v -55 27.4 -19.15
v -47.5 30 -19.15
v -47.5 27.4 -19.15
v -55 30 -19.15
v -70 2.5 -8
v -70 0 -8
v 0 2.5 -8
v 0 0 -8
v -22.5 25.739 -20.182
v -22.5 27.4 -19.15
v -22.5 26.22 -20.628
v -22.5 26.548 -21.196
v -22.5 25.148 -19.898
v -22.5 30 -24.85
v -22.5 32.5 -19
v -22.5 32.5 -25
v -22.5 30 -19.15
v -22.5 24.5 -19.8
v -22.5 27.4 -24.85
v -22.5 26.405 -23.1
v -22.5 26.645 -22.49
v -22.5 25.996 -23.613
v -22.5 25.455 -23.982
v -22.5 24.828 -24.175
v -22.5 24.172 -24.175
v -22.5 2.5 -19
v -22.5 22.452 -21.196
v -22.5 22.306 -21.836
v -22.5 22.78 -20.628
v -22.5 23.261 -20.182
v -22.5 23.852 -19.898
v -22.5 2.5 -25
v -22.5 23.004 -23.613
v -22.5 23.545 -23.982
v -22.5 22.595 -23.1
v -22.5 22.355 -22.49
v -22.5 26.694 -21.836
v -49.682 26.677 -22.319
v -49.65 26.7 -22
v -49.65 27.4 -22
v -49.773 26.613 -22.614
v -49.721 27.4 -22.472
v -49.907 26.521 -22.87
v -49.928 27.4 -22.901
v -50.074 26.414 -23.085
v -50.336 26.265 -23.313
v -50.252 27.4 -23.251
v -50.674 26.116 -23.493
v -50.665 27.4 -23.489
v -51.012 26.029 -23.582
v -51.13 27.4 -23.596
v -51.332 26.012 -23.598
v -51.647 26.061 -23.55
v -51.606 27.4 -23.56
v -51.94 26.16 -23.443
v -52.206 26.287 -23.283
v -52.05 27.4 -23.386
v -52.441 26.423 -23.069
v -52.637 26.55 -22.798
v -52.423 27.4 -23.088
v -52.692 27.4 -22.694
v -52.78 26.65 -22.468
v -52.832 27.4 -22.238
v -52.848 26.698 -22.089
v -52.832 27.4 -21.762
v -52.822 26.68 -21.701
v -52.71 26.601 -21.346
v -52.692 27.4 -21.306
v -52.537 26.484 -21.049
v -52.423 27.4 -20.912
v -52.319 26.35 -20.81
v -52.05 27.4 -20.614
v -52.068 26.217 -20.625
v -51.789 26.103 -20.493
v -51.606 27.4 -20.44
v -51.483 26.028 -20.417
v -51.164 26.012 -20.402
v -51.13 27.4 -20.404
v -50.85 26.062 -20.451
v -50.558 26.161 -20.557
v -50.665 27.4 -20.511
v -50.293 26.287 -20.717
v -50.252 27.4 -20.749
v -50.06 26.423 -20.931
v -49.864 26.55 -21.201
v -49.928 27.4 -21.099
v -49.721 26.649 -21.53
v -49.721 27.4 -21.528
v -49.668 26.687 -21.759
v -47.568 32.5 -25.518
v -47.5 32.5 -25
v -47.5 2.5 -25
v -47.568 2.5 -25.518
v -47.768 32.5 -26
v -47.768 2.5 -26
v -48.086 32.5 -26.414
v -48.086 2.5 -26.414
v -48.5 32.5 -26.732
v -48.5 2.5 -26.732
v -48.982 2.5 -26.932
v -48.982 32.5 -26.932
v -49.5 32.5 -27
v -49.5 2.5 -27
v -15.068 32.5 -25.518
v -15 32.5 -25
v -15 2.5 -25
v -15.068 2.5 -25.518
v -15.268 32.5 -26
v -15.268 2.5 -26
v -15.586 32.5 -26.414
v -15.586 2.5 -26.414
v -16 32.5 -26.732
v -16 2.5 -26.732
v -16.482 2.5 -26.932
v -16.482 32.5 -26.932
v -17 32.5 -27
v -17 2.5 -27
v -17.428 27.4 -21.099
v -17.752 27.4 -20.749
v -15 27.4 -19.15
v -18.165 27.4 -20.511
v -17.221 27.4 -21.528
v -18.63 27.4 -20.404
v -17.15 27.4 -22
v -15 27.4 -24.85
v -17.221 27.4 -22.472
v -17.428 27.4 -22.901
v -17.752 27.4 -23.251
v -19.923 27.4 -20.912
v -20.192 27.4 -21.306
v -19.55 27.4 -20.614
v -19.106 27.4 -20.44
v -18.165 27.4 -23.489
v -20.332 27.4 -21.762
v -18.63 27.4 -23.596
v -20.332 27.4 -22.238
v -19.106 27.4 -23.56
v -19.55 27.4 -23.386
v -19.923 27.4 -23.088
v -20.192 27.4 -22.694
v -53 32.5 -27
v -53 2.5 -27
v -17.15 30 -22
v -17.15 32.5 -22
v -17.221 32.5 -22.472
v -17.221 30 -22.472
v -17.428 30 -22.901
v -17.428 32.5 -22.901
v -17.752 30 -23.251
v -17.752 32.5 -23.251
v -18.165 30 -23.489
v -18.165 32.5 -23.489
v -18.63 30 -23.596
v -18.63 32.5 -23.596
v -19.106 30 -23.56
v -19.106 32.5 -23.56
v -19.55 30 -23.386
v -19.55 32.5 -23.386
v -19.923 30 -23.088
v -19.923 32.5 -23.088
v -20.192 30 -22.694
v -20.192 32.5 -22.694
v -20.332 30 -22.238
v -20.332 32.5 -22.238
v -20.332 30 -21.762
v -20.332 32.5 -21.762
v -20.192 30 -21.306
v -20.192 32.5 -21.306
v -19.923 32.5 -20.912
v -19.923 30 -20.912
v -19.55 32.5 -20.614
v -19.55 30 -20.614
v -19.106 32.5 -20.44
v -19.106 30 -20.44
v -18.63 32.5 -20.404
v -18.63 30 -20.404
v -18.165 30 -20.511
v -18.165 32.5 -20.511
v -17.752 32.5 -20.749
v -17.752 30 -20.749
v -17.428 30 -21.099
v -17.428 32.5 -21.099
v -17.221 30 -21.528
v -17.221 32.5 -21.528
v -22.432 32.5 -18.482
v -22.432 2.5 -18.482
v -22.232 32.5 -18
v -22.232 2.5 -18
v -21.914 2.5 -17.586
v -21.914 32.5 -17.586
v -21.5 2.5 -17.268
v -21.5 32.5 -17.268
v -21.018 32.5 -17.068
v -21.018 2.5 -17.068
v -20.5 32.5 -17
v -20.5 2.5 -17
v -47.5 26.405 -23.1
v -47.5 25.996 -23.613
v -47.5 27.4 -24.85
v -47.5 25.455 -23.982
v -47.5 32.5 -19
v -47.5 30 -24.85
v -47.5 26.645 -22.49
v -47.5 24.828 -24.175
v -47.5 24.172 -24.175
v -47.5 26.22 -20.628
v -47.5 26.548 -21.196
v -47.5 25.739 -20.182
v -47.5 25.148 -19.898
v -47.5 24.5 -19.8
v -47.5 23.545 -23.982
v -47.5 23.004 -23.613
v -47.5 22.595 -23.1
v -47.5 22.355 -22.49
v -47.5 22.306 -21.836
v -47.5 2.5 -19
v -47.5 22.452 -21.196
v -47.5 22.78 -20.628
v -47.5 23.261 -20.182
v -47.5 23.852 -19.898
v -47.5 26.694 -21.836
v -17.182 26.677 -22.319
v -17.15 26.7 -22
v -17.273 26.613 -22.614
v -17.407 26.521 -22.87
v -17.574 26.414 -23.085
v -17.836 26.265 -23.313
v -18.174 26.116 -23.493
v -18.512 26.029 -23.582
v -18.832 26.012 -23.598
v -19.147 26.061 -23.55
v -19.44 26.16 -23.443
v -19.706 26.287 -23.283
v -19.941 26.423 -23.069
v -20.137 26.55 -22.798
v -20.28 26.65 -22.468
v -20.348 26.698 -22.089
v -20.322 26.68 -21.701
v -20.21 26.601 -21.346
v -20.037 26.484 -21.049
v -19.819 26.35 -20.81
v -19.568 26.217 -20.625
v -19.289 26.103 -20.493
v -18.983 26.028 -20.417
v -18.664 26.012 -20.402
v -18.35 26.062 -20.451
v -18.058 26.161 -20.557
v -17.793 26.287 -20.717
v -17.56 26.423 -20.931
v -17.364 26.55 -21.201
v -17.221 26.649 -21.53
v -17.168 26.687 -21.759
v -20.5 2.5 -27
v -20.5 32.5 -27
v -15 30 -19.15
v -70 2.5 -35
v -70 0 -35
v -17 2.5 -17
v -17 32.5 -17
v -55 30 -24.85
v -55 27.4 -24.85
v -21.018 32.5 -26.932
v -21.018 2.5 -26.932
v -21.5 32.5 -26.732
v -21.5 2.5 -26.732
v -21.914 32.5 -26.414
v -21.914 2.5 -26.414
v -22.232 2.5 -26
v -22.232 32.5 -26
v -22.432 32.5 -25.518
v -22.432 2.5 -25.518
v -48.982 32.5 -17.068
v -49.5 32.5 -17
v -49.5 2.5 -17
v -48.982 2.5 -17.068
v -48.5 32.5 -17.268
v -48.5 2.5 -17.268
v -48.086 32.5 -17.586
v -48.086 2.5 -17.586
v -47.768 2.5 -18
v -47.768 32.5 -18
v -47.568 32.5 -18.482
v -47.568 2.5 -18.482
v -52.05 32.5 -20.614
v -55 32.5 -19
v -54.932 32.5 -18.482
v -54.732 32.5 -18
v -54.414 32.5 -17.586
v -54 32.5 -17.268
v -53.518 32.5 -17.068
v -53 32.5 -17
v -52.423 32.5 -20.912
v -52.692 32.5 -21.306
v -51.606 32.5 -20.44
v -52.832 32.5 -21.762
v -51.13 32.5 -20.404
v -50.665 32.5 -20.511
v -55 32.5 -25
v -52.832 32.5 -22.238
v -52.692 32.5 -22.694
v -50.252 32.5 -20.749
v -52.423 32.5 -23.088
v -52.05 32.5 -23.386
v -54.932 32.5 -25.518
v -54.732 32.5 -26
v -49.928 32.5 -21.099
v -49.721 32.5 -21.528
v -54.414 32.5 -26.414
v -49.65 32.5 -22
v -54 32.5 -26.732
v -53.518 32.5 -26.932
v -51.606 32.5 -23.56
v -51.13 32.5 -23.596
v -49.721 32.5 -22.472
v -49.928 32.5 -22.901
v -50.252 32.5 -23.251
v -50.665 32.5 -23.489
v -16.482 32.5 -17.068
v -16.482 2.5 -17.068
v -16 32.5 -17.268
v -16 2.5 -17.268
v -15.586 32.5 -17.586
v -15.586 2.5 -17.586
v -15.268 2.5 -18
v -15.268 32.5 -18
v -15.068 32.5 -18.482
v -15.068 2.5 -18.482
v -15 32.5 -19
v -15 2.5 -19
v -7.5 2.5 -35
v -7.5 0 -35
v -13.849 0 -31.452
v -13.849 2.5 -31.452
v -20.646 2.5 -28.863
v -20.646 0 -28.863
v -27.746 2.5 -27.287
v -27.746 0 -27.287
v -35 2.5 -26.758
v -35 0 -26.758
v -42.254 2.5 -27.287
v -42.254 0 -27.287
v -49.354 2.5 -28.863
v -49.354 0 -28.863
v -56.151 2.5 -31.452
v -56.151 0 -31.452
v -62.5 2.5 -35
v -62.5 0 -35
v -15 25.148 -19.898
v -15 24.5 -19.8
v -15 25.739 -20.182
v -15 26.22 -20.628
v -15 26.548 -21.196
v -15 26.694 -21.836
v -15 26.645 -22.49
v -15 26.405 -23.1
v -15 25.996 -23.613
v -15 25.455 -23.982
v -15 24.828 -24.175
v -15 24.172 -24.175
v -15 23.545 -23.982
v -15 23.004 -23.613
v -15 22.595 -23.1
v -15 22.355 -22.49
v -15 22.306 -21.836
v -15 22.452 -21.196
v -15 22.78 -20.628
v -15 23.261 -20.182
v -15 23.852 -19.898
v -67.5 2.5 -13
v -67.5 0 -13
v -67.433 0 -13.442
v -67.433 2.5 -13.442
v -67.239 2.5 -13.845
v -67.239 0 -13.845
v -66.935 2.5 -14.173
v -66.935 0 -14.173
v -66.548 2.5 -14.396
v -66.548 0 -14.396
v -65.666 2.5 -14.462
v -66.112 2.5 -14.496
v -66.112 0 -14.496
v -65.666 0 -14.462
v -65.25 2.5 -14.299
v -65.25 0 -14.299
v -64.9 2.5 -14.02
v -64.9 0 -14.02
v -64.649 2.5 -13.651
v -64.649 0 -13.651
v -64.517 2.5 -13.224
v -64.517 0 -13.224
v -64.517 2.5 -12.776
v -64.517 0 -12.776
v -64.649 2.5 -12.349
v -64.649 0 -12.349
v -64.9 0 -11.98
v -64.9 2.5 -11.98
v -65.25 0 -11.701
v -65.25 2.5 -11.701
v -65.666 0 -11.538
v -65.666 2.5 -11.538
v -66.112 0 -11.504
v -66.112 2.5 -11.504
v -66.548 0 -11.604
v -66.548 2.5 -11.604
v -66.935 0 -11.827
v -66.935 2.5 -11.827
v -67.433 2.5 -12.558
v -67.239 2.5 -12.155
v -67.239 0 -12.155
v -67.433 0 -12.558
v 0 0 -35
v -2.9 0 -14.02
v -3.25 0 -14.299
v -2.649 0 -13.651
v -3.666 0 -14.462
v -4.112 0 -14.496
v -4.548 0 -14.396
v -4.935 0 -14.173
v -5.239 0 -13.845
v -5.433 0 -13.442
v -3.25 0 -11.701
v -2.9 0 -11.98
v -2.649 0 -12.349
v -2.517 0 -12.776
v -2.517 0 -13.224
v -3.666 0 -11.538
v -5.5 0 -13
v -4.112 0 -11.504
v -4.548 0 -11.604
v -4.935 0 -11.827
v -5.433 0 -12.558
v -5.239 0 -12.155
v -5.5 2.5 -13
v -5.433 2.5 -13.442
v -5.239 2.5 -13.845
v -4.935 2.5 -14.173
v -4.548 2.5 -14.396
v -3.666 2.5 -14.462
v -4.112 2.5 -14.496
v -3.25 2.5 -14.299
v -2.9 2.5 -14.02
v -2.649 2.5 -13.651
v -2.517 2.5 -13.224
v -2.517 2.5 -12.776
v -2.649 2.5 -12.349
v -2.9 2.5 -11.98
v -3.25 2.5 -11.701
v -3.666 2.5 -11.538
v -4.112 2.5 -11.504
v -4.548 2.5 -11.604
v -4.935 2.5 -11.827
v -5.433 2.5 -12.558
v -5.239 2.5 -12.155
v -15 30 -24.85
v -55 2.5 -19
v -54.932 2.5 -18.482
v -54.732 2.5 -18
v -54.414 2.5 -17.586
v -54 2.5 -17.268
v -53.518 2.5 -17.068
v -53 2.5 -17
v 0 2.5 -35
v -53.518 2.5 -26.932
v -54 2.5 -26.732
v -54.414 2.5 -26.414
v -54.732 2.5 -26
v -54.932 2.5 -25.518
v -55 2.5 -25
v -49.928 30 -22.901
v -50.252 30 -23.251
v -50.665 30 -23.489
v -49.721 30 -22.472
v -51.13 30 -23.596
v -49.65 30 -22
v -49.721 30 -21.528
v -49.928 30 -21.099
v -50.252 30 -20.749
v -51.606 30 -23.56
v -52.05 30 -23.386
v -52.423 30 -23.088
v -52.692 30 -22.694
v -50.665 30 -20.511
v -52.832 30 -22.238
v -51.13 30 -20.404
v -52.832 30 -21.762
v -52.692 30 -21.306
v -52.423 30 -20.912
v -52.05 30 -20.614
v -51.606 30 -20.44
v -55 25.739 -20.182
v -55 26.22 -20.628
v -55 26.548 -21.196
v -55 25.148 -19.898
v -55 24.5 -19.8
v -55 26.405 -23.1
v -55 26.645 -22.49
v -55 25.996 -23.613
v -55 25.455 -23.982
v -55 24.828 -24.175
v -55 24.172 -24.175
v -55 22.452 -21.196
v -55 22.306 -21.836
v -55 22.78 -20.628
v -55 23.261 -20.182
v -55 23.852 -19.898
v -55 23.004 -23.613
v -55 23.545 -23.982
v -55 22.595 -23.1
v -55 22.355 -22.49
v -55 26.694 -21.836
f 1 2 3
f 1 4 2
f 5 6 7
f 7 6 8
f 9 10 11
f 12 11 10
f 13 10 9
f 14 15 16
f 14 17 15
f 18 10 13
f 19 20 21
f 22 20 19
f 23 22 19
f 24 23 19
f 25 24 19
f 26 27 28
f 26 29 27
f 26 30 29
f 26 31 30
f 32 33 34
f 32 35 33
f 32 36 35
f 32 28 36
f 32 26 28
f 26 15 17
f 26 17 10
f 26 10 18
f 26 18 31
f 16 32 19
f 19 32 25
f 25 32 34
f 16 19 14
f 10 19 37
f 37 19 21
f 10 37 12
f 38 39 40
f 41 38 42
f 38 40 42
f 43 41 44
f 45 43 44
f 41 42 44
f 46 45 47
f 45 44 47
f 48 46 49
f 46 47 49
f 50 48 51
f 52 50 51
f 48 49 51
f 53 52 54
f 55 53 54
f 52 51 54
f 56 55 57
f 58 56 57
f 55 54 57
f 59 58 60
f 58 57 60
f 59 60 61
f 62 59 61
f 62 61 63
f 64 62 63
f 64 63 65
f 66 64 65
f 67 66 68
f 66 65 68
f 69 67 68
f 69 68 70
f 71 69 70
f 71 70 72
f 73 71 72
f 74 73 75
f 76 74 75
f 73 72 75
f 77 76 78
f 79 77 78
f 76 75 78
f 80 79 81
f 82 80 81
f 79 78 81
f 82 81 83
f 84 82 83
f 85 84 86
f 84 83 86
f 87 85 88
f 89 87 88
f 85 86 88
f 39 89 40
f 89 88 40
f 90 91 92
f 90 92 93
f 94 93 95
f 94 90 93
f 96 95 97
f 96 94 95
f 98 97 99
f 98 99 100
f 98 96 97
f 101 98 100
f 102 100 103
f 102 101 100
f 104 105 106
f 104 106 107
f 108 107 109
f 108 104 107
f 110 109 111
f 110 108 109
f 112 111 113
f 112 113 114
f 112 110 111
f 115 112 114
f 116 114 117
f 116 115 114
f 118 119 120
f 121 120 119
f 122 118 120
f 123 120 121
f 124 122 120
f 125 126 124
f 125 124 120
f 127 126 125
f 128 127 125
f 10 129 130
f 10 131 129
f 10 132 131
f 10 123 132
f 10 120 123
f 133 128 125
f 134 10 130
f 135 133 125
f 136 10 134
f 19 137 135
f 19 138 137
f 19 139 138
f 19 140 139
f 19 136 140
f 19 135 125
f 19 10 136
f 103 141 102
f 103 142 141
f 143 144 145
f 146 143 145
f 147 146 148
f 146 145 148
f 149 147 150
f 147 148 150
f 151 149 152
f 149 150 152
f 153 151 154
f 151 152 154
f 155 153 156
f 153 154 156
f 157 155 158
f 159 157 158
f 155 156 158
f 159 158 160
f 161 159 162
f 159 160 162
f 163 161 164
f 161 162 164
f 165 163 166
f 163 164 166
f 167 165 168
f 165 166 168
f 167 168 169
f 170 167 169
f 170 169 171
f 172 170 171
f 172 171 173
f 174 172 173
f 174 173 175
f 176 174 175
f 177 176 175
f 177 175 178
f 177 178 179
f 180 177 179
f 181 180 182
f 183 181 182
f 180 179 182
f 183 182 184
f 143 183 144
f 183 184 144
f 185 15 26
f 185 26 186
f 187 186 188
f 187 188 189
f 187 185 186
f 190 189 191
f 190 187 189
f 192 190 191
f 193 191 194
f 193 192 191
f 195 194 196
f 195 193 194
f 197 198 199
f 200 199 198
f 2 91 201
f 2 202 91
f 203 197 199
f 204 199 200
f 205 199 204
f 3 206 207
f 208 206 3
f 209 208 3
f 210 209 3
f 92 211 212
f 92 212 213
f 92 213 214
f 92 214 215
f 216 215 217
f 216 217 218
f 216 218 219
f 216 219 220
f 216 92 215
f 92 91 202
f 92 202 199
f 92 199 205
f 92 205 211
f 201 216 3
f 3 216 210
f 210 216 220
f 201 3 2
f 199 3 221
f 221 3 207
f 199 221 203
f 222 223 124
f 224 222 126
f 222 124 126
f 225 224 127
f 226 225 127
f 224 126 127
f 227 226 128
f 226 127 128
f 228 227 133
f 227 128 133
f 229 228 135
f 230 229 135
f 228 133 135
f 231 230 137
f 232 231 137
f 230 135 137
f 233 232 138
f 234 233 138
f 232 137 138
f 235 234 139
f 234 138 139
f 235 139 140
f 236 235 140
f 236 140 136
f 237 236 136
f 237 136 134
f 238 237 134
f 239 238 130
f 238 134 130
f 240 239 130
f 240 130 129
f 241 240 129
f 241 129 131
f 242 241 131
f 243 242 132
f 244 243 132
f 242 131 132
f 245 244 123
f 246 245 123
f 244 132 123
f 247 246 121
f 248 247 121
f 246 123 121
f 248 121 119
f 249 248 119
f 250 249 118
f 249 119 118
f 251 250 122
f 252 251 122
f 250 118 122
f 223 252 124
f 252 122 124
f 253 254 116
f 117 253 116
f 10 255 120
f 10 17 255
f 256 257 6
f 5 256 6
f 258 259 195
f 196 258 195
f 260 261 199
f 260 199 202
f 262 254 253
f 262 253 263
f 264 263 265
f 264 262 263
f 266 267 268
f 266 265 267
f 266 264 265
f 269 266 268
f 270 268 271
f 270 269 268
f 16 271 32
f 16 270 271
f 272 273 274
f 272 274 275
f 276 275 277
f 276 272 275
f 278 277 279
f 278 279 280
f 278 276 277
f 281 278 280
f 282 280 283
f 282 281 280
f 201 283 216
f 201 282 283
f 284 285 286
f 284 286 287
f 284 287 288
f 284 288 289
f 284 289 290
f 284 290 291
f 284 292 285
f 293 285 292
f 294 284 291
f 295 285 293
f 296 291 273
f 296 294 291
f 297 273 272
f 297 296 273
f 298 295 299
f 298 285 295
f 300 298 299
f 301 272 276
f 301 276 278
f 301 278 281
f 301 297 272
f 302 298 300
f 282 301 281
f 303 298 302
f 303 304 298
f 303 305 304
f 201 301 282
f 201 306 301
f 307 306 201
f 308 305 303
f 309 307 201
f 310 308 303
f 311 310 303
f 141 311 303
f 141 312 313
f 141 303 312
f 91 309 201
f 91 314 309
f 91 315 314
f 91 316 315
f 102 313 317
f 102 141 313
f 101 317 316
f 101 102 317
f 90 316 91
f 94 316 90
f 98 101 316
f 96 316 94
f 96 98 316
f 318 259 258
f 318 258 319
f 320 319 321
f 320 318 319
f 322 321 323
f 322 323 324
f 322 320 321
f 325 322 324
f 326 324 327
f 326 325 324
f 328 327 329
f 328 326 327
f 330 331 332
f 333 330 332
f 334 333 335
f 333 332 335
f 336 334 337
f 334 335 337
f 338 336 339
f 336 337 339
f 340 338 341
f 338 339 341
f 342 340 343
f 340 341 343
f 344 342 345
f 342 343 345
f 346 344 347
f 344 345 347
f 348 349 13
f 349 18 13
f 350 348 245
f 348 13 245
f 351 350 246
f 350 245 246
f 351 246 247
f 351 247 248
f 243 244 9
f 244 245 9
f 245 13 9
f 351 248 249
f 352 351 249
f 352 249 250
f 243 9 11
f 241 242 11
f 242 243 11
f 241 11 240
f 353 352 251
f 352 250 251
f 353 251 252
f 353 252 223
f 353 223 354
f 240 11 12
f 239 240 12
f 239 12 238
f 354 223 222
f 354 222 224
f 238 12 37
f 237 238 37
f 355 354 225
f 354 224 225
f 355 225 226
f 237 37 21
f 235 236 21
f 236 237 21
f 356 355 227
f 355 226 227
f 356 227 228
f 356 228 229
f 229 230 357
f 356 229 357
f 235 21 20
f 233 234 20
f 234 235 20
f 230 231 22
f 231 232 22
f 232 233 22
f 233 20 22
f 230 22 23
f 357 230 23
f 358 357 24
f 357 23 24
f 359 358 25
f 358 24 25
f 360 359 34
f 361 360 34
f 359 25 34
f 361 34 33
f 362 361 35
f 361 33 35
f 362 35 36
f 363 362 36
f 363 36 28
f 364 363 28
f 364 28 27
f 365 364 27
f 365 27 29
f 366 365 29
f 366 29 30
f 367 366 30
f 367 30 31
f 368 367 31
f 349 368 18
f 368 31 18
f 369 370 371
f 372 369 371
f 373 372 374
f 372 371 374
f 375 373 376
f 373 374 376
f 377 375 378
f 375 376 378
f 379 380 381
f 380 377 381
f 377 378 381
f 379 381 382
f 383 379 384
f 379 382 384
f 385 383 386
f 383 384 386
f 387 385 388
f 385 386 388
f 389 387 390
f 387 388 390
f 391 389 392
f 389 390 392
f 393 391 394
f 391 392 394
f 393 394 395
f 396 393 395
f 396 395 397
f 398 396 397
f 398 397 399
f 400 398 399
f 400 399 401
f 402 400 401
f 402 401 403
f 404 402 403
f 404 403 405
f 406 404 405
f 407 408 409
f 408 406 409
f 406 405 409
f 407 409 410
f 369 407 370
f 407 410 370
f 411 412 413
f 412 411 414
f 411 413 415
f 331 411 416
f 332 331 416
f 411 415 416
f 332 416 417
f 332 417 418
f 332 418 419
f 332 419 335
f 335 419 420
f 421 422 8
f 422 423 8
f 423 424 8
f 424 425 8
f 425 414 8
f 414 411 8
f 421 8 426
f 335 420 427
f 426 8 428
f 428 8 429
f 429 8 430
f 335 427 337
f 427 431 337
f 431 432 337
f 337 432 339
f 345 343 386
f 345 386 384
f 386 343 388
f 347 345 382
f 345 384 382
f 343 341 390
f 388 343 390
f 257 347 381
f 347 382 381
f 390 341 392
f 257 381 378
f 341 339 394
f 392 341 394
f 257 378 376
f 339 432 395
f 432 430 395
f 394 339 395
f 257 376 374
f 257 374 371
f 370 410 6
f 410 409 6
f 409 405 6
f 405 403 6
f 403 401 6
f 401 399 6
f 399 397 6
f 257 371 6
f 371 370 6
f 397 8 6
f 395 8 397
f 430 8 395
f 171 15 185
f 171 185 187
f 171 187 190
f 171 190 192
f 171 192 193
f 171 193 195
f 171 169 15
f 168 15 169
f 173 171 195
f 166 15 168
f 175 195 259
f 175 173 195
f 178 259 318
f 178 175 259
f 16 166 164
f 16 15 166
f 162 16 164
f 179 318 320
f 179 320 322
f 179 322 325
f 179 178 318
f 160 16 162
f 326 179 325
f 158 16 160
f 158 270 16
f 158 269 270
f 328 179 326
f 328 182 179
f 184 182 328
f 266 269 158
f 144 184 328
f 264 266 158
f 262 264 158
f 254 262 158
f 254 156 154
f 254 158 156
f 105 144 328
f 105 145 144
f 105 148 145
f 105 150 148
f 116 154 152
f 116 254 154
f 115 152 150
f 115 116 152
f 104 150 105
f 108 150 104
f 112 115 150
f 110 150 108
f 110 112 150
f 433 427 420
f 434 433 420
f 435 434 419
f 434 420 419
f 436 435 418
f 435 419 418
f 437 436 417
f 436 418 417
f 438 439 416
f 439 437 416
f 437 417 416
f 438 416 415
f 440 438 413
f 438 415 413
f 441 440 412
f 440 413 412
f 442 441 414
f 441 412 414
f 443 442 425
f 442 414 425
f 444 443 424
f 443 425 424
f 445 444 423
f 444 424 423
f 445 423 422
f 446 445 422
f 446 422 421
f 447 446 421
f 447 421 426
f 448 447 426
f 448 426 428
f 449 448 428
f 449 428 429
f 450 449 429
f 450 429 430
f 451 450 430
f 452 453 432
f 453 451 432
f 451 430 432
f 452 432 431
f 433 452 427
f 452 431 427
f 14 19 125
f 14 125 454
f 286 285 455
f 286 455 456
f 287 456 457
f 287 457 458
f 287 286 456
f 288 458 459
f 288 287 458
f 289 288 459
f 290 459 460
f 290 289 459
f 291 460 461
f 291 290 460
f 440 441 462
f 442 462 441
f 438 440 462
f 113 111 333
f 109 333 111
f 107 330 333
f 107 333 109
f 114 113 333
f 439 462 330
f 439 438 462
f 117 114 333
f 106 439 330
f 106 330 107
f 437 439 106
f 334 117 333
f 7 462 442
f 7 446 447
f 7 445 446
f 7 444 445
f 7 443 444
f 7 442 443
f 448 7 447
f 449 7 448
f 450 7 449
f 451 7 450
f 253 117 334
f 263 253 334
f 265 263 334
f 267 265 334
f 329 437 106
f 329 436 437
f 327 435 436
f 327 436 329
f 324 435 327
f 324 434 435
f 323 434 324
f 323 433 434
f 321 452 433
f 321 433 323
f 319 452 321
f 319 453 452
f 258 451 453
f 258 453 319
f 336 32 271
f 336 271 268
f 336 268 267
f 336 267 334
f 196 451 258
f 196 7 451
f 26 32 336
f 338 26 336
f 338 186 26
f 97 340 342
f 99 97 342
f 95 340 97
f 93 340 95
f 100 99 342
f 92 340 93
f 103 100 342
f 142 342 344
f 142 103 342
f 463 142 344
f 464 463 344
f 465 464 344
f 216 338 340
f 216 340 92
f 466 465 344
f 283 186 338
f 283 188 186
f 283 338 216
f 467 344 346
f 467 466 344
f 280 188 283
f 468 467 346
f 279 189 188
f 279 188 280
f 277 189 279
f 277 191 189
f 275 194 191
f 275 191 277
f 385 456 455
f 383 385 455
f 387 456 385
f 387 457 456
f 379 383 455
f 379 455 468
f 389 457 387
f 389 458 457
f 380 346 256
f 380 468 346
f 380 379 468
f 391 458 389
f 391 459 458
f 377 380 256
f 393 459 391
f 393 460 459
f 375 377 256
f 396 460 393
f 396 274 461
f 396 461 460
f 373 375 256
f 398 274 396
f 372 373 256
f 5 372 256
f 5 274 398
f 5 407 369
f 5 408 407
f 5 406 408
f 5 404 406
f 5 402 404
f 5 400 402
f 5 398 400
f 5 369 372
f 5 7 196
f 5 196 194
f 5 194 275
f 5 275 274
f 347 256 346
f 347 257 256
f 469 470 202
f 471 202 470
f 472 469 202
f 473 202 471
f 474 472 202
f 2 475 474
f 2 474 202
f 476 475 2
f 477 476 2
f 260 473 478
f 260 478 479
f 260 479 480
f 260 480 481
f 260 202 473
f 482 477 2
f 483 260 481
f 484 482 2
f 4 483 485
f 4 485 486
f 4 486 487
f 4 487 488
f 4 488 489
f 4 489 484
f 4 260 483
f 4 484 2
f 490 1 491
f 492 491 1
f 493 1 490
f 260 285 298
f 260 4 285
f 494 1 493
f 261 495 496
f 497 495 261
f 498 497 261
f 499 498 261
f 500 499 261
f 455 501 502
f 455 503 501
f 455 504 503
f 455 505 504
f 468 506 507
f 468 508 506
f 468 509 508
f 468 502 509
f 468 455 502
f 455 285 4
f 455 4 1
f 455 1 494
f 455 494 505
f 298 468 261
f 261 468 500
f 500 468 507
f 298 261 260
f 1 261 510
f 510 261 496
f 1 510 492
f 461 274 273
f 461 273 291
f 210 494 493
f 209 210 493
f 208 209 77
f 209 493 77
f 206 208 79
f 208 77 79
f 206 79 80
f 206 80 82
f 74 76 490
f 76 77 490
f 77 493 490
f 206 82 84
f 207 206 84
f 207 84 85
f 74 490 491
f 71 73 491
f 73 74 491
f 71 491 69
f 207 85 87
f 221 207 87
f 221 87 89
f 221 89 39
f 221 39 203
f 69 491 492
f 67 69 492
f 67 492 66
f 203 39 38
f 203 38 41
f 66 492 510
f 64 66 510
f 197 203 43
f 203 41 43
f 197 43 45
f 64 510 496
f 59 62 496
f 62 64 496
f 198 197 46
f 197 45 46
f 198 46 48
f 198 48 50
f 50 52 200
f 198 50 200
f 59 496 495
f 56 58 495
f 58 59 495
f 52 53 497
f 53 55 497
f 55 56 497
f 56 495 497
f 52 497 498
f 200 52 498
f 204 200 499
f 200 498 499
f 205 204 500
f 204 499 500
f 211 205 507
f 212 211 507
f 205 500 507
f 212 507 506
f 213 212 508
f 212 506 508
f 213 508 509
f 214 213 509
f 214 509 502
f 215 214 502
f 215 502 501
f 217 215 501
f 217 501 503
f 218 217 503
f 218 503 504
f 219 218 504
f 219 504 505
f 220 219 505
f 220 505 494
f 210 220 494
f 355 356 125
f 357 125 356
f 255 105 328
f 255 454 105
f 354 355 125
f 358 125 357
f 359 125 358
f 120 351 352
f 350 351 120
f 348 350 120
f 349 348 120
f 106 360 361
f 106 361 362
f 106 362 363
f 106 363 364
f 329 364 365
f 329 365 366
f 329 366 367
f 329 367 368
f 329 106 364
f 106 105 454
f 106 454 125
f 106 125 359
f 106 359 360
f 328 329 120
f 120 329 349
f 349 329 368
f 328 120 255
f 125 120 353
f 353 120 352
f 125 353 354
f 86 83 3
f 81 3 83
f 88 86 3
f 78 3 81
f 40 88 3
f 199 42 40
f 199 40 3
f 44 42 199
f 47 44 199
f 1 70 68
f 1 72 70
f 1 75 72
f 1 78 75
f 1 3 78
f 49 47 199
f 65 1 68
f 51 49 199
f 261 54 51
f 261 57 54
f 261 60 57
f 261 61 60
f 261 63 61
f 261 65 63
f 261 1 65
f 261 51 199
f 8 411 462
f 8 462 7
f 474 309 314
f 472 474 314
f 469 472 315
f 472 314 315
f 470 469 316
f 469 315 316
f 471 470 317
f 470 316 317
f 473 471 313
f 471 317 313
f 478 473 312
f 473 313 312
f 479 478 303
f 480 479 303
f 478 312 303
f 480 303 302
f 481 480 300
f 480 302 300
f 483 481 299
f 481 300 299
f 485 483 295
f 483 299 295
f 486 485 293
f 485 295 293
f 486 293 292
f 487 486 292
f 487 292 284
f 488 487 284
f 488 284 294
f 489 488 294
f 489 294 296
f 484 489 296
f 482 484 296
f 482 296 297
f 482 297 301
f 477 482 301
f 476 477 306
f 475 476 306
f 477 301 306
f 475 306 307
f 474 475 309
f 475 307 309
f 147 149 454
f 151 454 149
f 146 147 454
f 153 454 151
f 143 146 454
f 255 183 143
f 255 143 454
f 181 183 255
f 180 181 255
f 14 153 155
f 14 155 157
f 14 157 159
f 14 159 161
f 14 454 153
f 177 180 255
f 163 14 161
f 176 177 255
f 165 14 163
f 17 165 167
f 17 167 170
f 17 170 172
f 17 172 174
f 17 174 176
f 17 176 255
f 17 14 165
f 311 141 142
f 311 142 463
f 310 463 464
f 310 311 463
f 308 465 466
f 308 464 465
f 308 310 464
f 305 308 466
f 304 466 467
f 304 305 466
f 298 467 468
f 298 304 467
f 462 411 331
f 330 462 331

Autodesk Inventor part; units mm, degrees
ref_plane "YZ Plane" through (0, 0, 0) normal (1, 0, 0) x (0, 1, 0)
ref_plane "XZ Plane" through (0, 0, 0) normal (0, 1, 0) x (-1, 0, 0)
ref_plane "XY Plane" through (0, 0, 0) normal (0, 0, 1) x (1, 0, 0)
sketch "Эскиз1" plane through (0, 0, 0) normal (0, 1, 0) x (-1, 0, 0)
  line L0 (70, -35) -> (62.5, -35)
  line L1 (0, -35) -> (7.5, -35)
  circle A0 centre (66, -13) radius 1.5
  circle A1 centre (4, -13) radius 1.5
  line L2 (70, -8) -> (0, -8)
  line L3 (70, -35) -> (70, -8)
  line L4 (0, -35) -> (0, -8)
  arc A2 (62.5, -35) -> (7.5, -35) centre (35, -76.7582) ccw
  point P0 (0, 0)
  dimension "d4" = 7.5
  dimension "d5" = 7.5
  dimension "d7" = 3
  dimension "d8" = 3
  dimension "d12" = 62
  dimension "d13" = 13
  dimension "d46" = 5
  dimension "d48" = 50
extrude "Выдавливание1" add sketch "Эскиз1" along normal blind 2.5
sketch "Эскиз2" plane through (0, 2.5, 0) normal (0, 1, 0) x (1, 0, 0)
  line L0 (-55, 27) -> (-47.5, 27)
  line L1 (-47.5, 27) -> (-47.5, 17)
  line L2 (-47.5, 17) -> (-55, 17)
  line L3 (-55, 17) -> (-55, 27)
  line L4 (-22.5, 27) -> (-15, 27)
  line L5 (-15, 27) -> (-15, 17)
  line L6 (-15, 17) -> (-22.5, 17)
  line L7 (-22.5, 17) -> (-22.5, 27)
  line L8 (-70, 35) -> (-70, 8) projected
  line L9 (0, 8) -> (0, 35) projected
  point P0 (0, 0)
  point P1 (-60, 0)
  point P2 (-15, 22)
  dimension "d17" = 7.5
  dimension "d18" = 10
  dimension "d19" = 7.5
  dimension "d20" = 10
  dimension "d23" = 17
  dimension "d24" = 17
  dimension "d49" = 15
  dimension "d50" = 15
extrude "Выдавливание2" add sketch "Эскиз2" along normal blind 30
sketch "Эскиз3" plane through (-55, 2.5, -27) normal (-1, 0, 0) x (0, 0, 1)
  line L0 (2.15, 27.5) -> (7.85, 27.5)
  line L1 (7.85, 27.5) -> (7.85, 24.9)
  line L2 (7.85, 24.9) -> (2.15, 24.9)
  line L3 (2.15, 24.9) -> (2.15, 27.5)
  line L4 (10, 0) -> (10, 30) projected
  line L5 (0, 30) -> (10, 30) projected
  circle A0 centre (5, 22) radius 2.2
  point P0 (27, -2.5)
  dimension "d27" = 5.7
  dimension "d28" = 2.15
  dimension "d29" = 2.6
  dimension "d30" = 2.5
  dimension "d31" = 4.4
  dimension "d32" = 8
  dimension "d44" = 5
extrude "Выдавливание3" cut sketch "Эскиз3" against normal blind 41
sketch "Эскиз4" plane through (0, 32.5, 0) normal (0, 1, 0) x (1, 0, 0)
  circle A0 centre (-18.75, 22) radius 1.6
  circle A1 centre (-51.25, 22) radius 1.6
  line L0 (-22.5, 27) -> (-22.5, 17) projected
  line L1 (-22.5, 17) -> (-15, 17) projected
  line L2 (-55, 17) -> (-47.5, 17) projected
  line L3 (-55, 27) -> (-55, 17) projected
  point P0 (0, 0)
  point P1 (-18.75, 17)
  dimension "d35" = 3.2
  dimension "d36" = 3.2
  dimension "d37" = 3.75
  dimension "d38" = 5
  dimension "d39" = 5
  dimension "d40" = 3.75
extrude "Выдавливание4" cut sketch "Эскиз4" against normal blind 8
fillet "Сопряжение2" radius 2 8 edges at (-15, 17.5, -27) (-15, 17.5, -17) (-22.5, 17.5, -27) (-22.5, 17.5, -17) (-55, 17.5, -27) (-47.5, 17.5, -27) (-55, 17.5, -17) (-47.5, 17.5, -17)
properties part number "kreplenie_dribler_V2"
